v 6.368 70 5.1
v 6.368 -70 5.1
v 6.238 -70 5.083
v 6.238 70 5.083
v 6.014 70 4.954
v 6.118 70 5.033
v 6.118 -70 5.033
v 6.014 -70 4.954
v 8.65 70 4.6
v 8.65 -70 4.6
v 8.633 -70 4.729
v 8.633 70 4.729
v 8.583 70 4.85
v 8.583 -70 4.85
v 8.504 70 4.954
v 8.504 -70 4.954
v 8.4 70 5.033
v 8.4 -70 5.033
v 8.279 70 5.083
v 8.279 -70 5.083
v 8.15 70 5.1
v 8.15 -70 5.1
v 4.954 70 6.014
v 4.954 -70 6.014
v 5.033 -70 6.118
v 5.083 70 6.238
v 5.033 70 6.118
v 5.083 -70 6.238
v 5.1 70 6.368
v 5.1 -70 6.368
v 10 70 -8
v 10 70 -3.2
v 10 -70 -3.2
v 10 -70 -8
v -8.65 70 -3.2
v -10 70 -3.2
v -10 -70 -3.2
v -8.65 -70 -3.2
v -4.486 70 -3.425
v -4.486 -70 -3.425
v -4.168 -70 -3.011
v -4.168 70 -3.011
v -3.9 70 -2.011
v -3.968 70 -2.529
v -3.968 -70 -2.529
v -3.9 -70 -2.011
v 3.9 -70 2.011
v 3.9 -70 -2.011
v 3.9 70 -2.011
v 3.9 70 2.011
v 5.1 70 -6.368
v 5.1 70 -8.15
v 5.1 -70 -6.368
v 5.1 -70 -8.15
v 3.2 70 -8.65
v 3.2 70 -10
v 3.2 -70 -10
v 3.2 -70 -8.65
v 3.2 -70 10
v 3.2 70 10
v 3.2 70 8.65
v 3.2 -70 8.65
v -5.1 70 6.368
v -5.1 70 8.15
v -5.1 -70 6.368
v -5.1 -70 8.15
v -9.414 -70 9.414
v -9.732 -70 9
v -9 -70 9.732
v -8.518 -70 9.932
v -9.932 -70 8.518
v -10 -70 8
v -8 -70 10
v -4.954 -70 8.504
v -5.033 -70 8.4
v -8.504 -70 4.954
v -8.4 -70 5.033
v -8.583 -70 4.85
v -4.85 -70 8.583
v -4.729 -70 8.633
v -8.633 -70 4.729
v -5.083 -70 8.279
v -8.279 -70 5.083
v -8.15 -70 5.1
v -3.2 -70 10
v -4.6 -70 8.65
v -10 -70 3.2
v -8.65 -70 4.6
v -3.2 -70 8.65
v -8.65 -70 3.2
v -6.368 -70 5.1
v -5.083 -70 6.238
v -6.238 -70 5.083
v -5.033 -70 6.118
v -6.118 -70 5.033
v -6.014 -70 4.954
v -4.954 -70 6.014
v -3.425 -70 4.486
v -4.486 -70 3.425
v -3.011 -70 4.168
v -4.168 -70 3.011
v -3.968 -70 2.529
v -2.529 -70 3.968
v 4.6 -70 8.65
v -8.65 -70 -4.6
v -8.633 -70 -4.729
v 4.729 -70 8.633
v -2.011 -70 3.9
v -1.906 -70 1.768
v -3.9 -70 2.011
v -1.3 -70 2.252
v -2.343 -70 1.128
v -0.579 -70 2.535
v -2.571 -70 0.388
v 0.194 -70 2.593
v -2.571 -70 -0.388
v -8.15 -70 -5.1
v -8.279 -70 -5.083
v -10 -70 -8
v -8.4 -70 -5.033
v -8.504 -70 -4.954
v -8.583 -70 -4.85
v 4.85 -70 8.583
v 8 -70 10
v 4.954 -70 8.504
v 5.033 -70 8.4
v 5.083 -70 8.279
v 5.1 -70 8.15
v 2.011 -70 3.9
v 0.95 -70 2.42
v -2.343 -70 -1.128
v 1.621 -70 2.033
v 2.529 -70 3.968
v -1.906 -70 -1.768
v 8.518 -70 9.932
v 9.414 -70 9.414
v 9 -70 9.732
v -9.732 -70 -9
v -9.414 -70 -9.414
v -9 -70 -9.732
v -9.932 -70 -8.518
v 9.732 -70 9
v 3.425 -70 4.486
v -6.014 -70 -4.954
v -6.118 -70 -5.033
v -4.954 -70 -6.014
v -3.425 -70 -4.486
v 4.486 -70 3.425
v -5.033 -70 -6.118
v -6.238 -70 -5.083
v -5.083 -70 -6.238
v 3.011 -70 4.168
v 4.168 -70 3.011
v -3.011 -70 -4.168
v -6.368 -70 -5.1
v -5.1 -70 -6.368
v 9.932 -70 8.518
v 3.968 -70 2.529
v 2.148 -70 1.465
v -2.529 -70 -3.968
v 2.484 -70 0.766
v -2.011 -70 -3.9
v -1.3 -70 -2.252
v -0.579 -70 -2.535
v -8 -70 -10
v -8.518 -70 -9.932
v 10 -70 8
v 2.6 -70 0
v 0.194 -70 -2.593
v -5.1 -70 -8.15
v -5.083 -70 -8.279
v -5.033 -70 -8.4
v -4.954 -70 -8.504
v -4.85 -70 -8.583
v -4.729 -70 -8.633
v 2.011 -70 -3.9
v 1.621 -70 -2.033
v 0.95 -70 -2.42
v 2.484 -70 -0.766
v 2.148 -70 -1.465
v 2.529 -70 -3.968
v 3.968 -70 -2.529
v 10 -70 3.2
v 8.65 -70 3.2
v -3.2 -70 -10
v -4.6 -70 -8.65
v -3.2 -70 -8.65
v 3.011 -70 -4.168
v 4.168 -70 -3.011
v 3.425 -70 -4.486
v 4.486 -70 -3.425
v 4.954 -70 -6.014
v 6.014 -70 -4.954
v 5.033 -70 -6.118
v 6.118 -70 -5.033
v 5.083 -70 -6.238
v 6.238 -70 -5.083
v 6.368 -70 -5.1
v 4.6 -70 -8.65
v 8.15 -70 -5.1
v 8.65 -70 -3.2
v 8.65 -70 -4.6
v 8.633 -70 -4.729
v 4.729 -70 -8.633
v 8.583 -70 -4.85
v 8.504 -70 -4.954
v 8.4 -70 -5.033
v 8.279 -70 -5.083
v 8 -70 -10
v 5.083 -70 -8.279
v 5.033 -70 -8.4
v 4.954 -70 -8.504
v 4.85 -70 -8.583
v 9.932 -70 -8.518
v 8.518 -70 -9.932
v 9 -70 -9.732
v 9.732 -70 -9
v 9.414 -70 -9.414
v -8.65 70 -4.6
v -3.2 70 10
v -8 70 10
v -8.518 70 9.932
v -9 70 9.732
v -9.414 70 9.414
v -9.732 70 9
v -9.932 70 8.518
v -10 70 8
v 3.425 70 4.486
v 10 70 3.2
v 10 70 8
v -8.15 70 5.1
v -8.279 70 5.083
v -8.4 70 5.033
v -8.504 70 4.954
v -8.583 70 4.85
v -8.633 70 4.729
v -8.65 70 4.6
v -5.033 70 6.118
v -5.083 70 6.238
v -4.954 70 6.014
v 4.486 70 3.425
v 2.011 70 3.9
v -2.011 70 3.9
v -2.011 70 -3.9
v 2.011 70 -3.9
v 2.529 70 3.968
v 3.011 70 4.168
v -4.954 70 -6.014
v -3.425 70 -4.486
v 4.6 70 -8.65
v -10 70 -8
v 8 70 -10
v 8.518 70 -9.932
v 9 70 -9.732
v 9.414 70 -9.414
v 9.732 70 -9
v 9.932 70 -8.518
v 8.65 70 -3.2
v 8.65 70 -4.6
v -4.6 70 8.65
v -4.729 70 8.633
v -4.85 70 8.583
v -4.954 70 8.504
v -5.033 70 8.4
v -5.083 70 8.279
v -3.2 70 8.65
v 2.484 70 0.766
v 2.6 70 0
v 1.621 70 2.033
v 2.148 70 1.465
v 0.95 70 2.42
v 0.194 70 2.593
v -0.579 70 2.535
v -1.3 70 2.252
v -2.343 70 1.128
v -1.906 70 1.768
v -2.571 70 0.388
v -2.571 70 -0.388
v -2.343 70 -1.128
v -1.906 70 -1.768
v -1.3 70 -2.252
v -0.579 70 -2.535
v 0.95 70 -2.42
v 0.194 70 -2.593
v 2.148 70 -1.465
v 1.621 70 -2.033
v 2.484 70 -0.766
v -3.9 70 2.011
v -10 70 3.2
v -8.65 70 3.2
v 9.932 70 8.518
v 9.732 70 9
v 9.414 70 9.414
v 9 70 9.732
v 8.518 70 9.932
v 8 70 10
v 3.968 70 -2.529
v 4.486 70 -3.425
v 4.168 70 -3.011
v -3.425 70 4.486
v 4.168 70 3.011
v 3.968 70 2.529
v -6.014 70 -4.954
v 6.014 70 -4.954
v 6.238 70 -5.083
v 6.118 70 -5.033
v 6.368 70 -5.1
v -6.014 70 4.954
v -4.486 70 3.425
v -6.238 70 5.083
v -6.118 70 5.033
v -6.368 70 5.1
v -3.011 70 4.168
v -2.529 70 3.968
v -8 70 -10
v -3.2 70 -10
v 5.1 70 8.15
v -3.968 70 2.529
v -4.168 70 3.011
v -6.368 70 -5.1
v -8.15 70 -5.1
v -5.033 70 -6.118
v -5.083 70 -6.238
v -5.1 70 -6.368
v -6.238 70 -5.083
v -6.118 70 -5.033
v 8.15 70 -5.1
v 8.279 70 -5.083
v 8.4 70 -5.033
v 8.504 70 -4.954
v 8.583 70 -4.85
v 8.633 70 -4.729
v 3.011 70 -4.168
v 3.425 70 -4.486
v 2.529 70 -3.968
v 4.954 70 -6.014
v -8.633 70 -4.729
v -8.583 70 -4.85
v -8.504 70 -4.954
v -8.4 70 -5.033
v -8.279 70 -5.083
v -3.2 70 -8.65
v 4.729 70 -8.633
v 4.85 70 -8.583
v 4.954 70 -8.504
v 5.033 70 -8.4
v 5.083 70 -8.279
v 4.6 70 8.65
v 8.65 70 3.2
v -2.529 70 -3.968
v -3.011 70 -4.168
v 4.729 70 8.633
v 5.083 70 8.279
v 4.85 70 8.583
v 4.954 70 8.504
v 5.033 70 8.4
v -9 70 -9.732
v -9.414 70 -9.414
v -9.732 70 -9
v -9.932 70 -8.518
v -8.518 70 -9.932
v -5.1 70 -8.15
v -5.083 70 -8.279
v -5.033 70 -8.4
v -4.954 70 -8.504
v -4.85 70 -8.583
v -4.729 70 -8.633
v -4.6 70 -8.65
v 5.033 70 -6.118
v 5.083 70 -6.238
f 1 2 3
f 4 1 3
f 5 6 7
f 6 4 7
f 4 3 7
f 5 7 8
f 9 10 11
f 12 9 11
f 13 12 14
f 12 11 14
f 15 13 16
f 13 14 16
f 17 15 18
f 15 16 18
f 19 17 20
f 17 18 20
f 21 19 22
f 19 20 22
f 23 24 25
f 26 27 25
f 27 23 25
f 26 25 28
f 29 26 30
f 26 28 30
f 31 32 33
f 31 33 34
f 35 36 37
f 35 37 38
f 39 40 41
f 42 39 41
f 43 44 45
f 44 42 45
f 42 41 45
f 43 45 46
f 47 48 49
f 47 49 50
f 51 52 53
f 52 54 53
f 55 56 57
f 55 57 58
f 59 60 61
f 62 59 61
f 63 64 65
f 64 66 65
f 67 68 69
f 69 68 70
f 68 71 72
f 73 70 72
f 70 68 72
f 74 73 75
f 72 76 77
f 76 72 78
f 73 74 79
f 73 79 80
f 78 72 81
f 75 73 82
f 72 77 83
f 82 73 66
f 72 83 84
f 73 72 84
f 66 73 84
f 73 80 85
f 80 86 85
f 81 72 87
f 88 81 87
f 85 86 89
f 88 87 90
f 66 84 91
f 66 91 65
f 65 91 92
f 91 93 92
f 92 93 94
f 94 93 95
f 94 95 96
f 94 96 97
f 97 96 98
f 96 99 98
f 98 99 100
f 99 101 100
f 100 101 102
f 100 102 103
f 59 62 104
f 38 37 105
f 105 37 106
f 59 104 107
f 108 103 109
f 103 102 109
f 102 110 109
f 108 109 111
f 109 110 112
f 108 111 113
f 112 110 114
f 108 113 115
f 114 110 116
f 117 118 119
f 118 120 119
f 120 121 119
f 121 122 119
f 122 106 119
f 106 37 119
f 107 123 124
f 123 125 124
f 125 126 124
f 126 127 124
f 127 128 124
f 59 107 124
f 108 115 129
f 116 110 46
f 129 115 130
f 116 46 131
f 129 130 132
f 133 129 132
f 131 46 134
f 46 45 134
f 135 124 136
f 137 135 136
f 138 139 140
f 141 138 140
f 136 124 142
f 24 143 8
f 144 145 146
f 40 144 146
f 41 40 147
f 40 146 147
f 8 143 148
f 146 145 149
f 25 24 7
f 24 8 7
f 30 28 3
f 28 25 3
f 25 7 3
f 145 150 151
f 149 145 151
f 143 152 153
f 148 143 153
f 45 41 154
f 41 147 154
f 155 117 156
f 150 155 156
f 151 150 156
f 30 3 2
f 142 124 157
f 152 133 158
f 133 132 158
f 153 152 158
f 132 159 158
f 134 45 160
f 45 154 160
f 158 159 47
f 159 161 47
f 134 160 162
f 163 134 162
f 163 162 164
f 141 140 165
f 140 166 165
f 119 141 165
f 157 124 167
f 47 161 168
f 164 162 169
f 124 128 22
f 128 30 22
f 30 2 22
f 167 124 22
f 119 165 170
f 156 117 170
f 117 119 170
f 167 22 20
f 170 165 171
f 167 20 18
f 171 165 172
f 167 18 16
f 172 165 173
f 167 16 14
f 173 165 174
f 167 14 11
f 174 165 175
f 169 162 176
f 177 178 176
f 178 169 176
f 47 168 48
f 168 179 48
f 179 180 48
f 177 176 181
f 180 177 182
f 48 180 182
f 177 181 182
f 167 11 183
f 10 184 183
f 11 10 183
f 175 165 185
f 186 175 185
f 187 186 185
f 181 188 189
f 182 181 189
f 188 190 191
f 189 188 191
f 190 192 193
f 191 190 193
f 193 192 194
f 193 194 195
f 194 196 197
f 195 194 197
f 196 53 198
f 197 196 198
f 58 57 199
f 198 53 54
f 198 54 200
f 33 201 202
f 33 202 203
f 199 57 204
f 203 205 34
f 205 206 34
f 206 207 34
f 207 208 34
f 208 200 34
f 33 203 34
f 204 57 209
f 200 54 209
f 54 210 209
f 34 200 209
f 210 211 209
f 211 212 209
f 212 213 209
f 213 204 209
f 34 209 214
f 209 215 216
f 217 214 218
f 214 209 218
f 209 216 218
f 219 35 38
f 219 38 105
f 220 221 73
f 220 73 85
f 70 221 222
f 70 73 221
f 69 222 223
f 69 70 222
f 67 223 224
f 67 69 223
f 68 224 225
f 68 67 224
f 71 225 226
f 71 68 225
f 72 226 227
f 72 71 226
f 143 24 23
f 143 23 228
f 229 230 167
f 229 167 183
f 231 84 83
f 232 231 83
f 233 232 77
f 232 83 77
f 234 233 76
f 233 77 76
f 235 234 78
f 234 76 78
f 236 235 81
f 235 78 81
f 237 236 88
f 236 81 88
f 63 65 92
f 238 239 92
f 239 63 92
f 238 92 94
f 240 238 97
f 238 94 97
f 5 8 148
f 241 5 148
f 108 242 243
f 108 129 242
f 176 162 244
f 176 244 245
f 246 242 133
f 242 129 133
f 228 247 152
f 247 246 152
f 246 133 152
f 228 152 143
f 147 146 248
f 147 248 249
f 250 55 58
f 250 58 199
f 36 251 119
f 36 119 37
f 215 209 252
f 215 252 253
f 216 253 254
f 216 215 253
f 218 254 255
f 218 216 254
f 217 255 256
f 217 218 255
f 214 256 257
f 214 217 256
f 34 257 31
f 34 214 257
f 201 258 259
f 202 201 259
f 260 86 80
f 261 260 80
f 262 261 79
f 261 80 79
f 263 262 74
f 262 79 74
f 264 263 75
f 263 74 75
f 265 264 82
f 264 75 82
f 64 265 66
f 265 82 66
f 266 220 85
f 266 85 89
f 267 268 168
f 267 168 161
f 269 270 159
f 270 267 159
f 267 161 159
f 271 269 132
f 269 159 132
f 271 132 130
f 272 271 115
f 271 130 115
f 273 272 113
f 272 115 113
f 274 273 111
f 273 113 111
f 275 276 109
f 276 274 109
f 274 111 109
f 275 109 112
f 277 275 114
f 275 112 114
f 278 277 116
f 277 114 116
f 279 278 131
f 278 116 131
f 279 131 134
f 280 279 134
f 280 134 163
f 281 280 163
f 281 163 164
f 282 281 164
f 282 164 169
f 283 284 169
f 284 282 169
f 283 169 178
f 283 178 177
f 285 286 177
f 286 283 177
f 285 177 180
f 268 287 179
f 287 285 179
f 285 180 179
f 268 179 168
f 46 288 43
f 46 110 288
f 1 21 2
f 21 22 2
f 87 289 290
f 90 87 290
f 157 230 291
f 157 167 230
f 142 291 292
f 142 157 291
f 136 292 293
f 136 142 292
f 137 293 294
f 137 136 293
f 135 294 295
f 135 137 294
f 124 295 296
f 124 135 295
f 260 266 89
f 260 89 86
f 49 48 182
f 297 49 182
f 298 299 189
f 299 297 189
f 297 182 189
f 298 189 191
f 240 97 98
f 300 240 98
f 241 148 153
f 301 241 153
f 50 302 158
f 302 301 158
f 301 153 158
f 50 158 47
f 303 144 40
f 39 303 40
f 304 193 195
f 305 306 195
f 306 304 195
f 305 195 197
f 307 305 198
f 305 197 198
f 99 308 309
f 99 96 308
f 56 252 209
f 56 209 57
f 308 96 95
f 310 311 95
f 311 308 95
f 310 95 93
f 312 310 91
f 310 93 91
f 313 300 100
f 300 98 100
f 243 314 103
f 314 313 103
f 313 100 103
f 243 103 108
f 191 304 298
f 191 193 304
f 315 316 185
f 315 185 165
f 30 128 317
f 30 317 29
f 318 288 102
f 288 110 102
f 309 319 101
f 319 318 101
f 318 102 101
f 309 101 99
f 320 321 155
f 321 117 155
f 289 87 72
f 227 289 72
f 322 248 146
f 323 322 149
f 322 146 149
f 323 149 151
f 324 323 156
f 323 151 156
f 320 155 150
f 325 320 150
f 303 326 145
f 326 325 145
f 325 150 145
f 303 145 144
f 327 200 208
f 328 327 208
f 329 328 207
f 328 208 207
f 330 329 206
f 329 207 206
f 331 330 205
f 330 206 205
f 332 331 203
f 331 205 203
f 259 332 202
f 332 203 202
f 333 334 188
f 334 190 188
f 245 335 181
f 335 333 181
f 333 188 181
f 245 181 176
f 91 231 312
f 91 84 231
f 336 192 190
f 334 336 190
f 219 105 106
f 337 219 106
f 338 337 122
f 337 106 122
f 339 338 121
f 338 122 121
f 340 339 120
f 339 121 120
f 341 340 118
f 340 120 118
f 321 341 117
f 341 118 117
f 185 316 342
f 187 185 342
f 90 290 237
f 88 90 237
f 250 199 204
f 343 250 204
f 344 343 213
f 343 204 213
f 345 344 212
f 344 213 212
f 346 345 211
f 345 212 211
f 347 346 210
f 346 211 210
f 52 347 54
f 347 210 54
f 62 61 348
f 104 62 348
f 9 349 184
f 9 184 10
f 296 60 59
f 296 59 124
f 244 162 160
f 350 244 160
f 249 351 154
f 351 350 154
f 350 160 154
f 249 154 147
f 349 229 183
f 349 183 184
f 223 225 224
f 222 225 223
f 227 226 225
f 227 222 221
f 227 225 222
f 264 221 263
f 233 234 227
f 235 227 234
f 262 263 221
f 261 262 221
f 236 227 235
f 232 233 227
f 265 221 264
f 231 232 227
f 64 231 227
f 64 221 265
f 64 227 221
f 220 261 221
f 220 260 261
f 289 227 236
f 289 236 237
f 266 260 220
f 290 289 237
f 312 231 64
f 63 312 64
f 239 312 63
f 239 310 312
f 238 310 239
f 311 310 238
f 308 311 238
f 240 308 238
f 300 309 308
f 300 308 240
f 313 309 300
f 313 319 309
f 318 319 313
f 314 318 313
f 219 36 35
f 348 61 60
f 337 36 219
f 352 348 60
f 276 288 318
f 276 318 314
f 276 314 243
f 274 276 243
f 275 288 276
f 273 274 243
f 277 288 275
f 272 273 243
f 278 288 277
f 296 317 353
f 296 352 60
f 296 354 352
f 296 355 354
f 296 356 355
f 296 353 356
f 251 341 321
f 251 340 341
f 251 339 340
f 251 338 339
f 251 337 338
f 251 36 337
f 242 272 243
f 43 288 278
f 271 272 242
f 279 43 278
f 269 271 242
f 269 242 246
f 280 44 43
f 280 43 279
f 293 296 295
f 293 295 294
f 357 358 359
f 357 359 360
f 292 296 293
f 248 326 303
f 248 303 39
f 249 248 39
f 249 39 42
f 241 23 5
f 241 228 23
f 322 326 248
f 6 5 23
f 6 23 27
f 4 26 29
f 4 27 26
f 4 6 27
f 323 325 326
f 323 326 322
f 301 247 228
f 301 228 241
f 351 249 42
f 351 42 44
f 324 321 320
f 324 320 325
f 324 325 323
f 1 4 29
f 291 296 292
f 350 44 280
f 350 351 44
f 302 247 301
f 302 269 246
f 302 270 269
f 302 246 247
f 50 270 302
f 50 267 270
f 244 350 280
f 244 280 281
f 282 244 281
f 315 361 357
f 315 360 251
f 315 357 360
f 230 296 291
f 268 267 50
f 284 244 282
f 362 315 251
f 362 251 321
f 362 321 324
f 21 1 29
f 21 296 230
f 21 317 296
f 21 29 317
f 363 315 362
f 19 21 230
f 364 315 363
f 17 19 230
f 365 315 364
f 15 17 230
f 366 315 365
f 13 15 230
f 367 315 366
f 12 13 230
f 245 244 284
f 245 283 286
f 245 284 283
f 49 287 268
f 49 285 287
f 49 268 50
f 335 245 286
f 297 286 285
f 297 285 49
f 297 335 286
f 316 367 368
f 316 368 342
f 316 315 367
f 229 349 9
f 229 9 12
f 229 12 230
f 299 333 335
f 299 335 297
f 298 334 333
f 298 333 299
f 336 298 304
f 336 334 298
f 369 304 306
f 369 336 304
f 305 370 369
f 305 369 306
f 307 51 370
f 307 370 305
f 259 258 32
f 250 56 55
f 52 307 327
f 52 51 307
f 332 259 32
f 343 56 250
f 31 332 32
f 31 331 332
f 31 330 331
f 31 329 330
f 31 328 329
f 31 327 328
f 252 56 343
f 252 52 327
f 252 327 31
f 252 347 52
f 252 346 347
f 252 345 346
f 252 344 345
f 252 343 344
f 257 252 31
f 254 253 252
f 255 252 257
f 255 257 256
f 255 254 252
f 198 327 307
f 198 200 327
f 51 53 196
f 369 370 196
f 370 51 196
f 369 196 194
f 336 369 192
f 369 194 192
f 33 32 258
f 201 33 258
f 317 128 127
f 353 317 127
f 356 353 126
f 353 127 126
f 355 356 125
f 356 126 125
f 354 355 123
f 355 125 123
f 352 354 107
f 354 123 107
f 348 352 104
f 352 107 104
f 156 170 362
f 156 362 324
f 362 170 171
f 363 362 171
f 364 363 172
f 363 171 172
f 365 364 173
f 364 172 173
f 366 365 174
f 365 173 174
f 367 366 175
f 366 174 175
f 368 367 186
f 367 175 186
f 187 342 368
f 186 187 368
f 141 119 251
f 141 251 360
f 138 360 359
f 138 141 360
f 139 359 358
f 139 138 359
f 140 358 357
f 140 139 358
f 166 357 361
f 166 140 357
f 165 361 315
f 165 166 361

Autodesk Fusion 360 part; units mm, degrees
sketch "スケッチ1" plane through (0, 0, 0) normal (0, 1, 0) x (1, 0, 0)
  line L0 (8, 10) -> (-8, 10)
  line L1 (-10, 8) -> (-10, -8)
  line L2 (-8, -10) -> (8, -10)
  line L3 (10, -8) -> (10, 8)
  line L4 (10, 10) -> (-10, -10) construction
  line L5 (-10, 10) -> (10, -10) construction
  circle A0 centre (0, 0) radius 2.6
  line L6 (-3.2, -10) -> (-3.2, -8.65)
  line L7 (-3.2, -8.65) -> (-4.6, -8.65)
  line L8 (-5.1, -8.15) -> (-5.1, -6.3678)
  line L9 (-4.9536, -6.0142) -> (-3.4251, -4.4858)
  line L10 (0, 0) -> (0, -10) construction
  line L11 (-2.0109, -3.9) -> (0, -3.9)
  arc A1 (-5.1, -8.15) -> (-4.6, -8.65) centre (-4.6, -8.15) ccw
  arc A2 (-4.9536, -6.0142) -> (-5.1, -6.3678) centre (-4.6, -6.3678) ccw
  arc A3 (-2.0109, -3.9) -> (-3.4251, -4.4858) centre (-2.0109, -5.9) ccw
  arc A4 (-10, -8) -> (-8, -10) centre (-8, -8) ccw
  arc A5 (10, 8) -> (8, 10) centre (8, 8) ccw
  arc A6 (8, -10) -> (10, -8) centre (8, -8) ccw
  arc A7 (-8, 10) -> (-10, 8) centre (-8, 8) ccw
  line L12 (3.2, -10) -> (3.2, -8.65)
  line L13 (3.2, -8.65) -> (4.6, -8.65)
  arc A8 (4.6, -8.65) -> (5.1, -8.15) centre (4.6, -8.15) ccw
  line L14 (5.1, -8.15) -> (5.1, -6.3678)
  arc A9 (5.1, -6.3678) -> (4.9536, -6.0142) centre (4.6, -6.3678) ccw
  line L15 (4.9536, -6.0142) -> (3.4251, -4.4858)
  arc A10 (3.4251, -4.4858) -> (2.0109, -3.9) centre (2.0109, -5.9) ccw
  line L16 (2.0109, -3.9) -> (0, -3.9)
  line L17 (10, -3.2) -> (8.65, -3.2)
  line L18 (8.65, -3.2) -> (8.65, -4.6)
  arc A11 (8.15, -5.1) -> (8.65, -4.6) centre (8.15, -4.6) ccw
  line L19 (8.15, -5.1) -> (6.3678, -5.1)
  arc A12 (6.0142, -4.9536) -> (6.3678, -5.1) centre (6.3678, -4.6) ccw
  line L20 (6.0142, -4.9536) -> (4.4858, -3.4251)
  arc A13 (3.9, -2.0109) -> (4.4858, -3.4251) centre (5.9, -2.0109) ccw
  line L21 (3.9, -2.0109) -> (3.9, 0)
  line L22 (3.9, 2.0109) -> (3.9, 0)
  arc A14 (4.4858, 3.4251) -> (3.9, 2.0109) centre (5.9, 2.0109) ccw
  line L23 (6.0142, 4.9536) -> (4.4858, 3.4251)
  arc A15 (6.3678, 5.1) -> (6.0142, 4.9536) centre (6.3678, 4.6) ccw
  line L24 (8.15, 5.1) -> (6.3678, 5.1)
  arc A16 (8.65, 4.6) -> (8.15, 5.1) centre (8.15, 4.6) ccw
  line L25 (8.65, 3.2) -> (8.65, 4.6)
  line L26 (10, 3.2) -> (8.65, 3.2)
  line L27 (3.2, 10) -> (3.2, 8.65)
  line L28 (3.2, 8.65) -> (4.6, 8.65)
  arc A17 (5.1, 8.15) -> (4.6, 8.65) centre (4.6, 8.15) ccw
  line L29 (5.1, 8.15) -> (5.1, 6.3678)
  arc A18 (4.9536, 6.0142) -> (5.1, 6.3678) centre (4.6, 6.3678) ccw
  line L30 (4.9536, 6.0142) -> (3.4251, 4.4858)
  arc A19 (2.0109, 3.9) -> (3.4251, 4.4858) centre (2.0109, 5.9) ccw
  line L31 (2.0109, 3.9) -> (0, 3.9)
  line L32 (-2.0109, 3.9) -> (0, 3.9)
  arc A20 (-3.4251, 4.4858) -> (-2.0109, 3.9) centre (-2.0109, 5.9) ccw
  line L33 (-4.9536, 6.0142) -> (-3.4251, 4.4858)
  arc A21 (-5.1, 6.3678) -> (-4.9536, 6.0142) centre (-4.6, 6.3678) ccw
  line L34 (-5.1, 8.15) -> (-5.1, 6.3678)
  arc A22 (-4.6, 8.65) -> (-5.1, 8.15) centre (-4.6, 8.15) ccw
  line L35 (-3.2, 8.65) -> (-4.6, 8.65)
  line L36 (-3.2, 10) -> (-3.2, 8.65)
  line L37 (-10, 3.2) -> (-8.65, 3.2)
  line L38 (-8.65, 3.2) -> (-8.65, 4.6)
  arc A23 (-8.15, 5.1) -> (-8.65, 4.6) centre (-8.15, 4.6) ccw
  line L39 (-8.15, 5.1) -> (-6.3678, 5.1)
  arc A24 (-6.0142, 4.9536) -> (-6.3678, 5.1) centre (-6.3678, 4.6) ccw
  line L40 (-6.0142, 4.9536) -> (-4.4858, 3.4251)
  arc A25 (-3.9, 2.0109) -> (-4.4858, 3.4251) centre (-5.9, 2.0109) ccw
  line L41 (-3.9, 2.0109) -> (-3.9, 0)
  line L42 (-3.9, -2.0109) -> (-3.9, 0)
  arc A26 (-4.4858, -3.4251) -> (-3.9, -2.0109) centre (-5.9, -2.0109) ccw
  line L43 (-6.0142, -4.9536) -> (-4.4858, -3.4251)
  arc A27 (-6.3678, -5.1) -> (-6.0142, -4.9536) centre (-6.3678, -4.6) ccw
  line L44 (-8.15, -5.1) -> (-6.3678, -5.1)
  arc A28 (-8.65, -4.6) -> (-8.15, -5.1) centre (-8.15, -4.6) ccw
  line L45 (-8.65, -3.2) -> (-8.65, -4.6)
  line L46 (-10, -3.2) -> (-8.65, -3.2)
  dimension "d1" = 20
  dimension "d2" = 20
  dimension "d3" = 5.2
  dimension "d4" = 1.35
  dimension "d5" = 3.2
  dimension "d6" = 5.1
  dimension "d7" = 6.1
  dimension "d8" = 0.75
  dimension "d9" = 0.5
  dimension "d10" = 2
  dimension "d11" = 2
  dimension "d12" = 2
  dimension "d13" = 2
  dimension "d14" = 2
  dimension "d16" = 360
extrude "押し出し1" add sketch "スケッチ1" along normal mid plane 140 contours L0 L1 L2 L3 L6 L7 L8 L9 L11 A1 A2 A3 A4 A5 A6 A7 L12 L13 A8 L14 A9 L15 A10 L16 L17 L18 A11 L19 A12 L20 A13 L21 L22 A14 L23 A15 L24 A16 L25 L26 L27 L28 A17 L29 A18 L30 A19 L31 L32 A20 L33 A21 L34 A22 L35 L36 L37 L38 A23 L39 A24 L40 A25 L41 L42 A26 L43 A27 L44 A28 L45 L46
